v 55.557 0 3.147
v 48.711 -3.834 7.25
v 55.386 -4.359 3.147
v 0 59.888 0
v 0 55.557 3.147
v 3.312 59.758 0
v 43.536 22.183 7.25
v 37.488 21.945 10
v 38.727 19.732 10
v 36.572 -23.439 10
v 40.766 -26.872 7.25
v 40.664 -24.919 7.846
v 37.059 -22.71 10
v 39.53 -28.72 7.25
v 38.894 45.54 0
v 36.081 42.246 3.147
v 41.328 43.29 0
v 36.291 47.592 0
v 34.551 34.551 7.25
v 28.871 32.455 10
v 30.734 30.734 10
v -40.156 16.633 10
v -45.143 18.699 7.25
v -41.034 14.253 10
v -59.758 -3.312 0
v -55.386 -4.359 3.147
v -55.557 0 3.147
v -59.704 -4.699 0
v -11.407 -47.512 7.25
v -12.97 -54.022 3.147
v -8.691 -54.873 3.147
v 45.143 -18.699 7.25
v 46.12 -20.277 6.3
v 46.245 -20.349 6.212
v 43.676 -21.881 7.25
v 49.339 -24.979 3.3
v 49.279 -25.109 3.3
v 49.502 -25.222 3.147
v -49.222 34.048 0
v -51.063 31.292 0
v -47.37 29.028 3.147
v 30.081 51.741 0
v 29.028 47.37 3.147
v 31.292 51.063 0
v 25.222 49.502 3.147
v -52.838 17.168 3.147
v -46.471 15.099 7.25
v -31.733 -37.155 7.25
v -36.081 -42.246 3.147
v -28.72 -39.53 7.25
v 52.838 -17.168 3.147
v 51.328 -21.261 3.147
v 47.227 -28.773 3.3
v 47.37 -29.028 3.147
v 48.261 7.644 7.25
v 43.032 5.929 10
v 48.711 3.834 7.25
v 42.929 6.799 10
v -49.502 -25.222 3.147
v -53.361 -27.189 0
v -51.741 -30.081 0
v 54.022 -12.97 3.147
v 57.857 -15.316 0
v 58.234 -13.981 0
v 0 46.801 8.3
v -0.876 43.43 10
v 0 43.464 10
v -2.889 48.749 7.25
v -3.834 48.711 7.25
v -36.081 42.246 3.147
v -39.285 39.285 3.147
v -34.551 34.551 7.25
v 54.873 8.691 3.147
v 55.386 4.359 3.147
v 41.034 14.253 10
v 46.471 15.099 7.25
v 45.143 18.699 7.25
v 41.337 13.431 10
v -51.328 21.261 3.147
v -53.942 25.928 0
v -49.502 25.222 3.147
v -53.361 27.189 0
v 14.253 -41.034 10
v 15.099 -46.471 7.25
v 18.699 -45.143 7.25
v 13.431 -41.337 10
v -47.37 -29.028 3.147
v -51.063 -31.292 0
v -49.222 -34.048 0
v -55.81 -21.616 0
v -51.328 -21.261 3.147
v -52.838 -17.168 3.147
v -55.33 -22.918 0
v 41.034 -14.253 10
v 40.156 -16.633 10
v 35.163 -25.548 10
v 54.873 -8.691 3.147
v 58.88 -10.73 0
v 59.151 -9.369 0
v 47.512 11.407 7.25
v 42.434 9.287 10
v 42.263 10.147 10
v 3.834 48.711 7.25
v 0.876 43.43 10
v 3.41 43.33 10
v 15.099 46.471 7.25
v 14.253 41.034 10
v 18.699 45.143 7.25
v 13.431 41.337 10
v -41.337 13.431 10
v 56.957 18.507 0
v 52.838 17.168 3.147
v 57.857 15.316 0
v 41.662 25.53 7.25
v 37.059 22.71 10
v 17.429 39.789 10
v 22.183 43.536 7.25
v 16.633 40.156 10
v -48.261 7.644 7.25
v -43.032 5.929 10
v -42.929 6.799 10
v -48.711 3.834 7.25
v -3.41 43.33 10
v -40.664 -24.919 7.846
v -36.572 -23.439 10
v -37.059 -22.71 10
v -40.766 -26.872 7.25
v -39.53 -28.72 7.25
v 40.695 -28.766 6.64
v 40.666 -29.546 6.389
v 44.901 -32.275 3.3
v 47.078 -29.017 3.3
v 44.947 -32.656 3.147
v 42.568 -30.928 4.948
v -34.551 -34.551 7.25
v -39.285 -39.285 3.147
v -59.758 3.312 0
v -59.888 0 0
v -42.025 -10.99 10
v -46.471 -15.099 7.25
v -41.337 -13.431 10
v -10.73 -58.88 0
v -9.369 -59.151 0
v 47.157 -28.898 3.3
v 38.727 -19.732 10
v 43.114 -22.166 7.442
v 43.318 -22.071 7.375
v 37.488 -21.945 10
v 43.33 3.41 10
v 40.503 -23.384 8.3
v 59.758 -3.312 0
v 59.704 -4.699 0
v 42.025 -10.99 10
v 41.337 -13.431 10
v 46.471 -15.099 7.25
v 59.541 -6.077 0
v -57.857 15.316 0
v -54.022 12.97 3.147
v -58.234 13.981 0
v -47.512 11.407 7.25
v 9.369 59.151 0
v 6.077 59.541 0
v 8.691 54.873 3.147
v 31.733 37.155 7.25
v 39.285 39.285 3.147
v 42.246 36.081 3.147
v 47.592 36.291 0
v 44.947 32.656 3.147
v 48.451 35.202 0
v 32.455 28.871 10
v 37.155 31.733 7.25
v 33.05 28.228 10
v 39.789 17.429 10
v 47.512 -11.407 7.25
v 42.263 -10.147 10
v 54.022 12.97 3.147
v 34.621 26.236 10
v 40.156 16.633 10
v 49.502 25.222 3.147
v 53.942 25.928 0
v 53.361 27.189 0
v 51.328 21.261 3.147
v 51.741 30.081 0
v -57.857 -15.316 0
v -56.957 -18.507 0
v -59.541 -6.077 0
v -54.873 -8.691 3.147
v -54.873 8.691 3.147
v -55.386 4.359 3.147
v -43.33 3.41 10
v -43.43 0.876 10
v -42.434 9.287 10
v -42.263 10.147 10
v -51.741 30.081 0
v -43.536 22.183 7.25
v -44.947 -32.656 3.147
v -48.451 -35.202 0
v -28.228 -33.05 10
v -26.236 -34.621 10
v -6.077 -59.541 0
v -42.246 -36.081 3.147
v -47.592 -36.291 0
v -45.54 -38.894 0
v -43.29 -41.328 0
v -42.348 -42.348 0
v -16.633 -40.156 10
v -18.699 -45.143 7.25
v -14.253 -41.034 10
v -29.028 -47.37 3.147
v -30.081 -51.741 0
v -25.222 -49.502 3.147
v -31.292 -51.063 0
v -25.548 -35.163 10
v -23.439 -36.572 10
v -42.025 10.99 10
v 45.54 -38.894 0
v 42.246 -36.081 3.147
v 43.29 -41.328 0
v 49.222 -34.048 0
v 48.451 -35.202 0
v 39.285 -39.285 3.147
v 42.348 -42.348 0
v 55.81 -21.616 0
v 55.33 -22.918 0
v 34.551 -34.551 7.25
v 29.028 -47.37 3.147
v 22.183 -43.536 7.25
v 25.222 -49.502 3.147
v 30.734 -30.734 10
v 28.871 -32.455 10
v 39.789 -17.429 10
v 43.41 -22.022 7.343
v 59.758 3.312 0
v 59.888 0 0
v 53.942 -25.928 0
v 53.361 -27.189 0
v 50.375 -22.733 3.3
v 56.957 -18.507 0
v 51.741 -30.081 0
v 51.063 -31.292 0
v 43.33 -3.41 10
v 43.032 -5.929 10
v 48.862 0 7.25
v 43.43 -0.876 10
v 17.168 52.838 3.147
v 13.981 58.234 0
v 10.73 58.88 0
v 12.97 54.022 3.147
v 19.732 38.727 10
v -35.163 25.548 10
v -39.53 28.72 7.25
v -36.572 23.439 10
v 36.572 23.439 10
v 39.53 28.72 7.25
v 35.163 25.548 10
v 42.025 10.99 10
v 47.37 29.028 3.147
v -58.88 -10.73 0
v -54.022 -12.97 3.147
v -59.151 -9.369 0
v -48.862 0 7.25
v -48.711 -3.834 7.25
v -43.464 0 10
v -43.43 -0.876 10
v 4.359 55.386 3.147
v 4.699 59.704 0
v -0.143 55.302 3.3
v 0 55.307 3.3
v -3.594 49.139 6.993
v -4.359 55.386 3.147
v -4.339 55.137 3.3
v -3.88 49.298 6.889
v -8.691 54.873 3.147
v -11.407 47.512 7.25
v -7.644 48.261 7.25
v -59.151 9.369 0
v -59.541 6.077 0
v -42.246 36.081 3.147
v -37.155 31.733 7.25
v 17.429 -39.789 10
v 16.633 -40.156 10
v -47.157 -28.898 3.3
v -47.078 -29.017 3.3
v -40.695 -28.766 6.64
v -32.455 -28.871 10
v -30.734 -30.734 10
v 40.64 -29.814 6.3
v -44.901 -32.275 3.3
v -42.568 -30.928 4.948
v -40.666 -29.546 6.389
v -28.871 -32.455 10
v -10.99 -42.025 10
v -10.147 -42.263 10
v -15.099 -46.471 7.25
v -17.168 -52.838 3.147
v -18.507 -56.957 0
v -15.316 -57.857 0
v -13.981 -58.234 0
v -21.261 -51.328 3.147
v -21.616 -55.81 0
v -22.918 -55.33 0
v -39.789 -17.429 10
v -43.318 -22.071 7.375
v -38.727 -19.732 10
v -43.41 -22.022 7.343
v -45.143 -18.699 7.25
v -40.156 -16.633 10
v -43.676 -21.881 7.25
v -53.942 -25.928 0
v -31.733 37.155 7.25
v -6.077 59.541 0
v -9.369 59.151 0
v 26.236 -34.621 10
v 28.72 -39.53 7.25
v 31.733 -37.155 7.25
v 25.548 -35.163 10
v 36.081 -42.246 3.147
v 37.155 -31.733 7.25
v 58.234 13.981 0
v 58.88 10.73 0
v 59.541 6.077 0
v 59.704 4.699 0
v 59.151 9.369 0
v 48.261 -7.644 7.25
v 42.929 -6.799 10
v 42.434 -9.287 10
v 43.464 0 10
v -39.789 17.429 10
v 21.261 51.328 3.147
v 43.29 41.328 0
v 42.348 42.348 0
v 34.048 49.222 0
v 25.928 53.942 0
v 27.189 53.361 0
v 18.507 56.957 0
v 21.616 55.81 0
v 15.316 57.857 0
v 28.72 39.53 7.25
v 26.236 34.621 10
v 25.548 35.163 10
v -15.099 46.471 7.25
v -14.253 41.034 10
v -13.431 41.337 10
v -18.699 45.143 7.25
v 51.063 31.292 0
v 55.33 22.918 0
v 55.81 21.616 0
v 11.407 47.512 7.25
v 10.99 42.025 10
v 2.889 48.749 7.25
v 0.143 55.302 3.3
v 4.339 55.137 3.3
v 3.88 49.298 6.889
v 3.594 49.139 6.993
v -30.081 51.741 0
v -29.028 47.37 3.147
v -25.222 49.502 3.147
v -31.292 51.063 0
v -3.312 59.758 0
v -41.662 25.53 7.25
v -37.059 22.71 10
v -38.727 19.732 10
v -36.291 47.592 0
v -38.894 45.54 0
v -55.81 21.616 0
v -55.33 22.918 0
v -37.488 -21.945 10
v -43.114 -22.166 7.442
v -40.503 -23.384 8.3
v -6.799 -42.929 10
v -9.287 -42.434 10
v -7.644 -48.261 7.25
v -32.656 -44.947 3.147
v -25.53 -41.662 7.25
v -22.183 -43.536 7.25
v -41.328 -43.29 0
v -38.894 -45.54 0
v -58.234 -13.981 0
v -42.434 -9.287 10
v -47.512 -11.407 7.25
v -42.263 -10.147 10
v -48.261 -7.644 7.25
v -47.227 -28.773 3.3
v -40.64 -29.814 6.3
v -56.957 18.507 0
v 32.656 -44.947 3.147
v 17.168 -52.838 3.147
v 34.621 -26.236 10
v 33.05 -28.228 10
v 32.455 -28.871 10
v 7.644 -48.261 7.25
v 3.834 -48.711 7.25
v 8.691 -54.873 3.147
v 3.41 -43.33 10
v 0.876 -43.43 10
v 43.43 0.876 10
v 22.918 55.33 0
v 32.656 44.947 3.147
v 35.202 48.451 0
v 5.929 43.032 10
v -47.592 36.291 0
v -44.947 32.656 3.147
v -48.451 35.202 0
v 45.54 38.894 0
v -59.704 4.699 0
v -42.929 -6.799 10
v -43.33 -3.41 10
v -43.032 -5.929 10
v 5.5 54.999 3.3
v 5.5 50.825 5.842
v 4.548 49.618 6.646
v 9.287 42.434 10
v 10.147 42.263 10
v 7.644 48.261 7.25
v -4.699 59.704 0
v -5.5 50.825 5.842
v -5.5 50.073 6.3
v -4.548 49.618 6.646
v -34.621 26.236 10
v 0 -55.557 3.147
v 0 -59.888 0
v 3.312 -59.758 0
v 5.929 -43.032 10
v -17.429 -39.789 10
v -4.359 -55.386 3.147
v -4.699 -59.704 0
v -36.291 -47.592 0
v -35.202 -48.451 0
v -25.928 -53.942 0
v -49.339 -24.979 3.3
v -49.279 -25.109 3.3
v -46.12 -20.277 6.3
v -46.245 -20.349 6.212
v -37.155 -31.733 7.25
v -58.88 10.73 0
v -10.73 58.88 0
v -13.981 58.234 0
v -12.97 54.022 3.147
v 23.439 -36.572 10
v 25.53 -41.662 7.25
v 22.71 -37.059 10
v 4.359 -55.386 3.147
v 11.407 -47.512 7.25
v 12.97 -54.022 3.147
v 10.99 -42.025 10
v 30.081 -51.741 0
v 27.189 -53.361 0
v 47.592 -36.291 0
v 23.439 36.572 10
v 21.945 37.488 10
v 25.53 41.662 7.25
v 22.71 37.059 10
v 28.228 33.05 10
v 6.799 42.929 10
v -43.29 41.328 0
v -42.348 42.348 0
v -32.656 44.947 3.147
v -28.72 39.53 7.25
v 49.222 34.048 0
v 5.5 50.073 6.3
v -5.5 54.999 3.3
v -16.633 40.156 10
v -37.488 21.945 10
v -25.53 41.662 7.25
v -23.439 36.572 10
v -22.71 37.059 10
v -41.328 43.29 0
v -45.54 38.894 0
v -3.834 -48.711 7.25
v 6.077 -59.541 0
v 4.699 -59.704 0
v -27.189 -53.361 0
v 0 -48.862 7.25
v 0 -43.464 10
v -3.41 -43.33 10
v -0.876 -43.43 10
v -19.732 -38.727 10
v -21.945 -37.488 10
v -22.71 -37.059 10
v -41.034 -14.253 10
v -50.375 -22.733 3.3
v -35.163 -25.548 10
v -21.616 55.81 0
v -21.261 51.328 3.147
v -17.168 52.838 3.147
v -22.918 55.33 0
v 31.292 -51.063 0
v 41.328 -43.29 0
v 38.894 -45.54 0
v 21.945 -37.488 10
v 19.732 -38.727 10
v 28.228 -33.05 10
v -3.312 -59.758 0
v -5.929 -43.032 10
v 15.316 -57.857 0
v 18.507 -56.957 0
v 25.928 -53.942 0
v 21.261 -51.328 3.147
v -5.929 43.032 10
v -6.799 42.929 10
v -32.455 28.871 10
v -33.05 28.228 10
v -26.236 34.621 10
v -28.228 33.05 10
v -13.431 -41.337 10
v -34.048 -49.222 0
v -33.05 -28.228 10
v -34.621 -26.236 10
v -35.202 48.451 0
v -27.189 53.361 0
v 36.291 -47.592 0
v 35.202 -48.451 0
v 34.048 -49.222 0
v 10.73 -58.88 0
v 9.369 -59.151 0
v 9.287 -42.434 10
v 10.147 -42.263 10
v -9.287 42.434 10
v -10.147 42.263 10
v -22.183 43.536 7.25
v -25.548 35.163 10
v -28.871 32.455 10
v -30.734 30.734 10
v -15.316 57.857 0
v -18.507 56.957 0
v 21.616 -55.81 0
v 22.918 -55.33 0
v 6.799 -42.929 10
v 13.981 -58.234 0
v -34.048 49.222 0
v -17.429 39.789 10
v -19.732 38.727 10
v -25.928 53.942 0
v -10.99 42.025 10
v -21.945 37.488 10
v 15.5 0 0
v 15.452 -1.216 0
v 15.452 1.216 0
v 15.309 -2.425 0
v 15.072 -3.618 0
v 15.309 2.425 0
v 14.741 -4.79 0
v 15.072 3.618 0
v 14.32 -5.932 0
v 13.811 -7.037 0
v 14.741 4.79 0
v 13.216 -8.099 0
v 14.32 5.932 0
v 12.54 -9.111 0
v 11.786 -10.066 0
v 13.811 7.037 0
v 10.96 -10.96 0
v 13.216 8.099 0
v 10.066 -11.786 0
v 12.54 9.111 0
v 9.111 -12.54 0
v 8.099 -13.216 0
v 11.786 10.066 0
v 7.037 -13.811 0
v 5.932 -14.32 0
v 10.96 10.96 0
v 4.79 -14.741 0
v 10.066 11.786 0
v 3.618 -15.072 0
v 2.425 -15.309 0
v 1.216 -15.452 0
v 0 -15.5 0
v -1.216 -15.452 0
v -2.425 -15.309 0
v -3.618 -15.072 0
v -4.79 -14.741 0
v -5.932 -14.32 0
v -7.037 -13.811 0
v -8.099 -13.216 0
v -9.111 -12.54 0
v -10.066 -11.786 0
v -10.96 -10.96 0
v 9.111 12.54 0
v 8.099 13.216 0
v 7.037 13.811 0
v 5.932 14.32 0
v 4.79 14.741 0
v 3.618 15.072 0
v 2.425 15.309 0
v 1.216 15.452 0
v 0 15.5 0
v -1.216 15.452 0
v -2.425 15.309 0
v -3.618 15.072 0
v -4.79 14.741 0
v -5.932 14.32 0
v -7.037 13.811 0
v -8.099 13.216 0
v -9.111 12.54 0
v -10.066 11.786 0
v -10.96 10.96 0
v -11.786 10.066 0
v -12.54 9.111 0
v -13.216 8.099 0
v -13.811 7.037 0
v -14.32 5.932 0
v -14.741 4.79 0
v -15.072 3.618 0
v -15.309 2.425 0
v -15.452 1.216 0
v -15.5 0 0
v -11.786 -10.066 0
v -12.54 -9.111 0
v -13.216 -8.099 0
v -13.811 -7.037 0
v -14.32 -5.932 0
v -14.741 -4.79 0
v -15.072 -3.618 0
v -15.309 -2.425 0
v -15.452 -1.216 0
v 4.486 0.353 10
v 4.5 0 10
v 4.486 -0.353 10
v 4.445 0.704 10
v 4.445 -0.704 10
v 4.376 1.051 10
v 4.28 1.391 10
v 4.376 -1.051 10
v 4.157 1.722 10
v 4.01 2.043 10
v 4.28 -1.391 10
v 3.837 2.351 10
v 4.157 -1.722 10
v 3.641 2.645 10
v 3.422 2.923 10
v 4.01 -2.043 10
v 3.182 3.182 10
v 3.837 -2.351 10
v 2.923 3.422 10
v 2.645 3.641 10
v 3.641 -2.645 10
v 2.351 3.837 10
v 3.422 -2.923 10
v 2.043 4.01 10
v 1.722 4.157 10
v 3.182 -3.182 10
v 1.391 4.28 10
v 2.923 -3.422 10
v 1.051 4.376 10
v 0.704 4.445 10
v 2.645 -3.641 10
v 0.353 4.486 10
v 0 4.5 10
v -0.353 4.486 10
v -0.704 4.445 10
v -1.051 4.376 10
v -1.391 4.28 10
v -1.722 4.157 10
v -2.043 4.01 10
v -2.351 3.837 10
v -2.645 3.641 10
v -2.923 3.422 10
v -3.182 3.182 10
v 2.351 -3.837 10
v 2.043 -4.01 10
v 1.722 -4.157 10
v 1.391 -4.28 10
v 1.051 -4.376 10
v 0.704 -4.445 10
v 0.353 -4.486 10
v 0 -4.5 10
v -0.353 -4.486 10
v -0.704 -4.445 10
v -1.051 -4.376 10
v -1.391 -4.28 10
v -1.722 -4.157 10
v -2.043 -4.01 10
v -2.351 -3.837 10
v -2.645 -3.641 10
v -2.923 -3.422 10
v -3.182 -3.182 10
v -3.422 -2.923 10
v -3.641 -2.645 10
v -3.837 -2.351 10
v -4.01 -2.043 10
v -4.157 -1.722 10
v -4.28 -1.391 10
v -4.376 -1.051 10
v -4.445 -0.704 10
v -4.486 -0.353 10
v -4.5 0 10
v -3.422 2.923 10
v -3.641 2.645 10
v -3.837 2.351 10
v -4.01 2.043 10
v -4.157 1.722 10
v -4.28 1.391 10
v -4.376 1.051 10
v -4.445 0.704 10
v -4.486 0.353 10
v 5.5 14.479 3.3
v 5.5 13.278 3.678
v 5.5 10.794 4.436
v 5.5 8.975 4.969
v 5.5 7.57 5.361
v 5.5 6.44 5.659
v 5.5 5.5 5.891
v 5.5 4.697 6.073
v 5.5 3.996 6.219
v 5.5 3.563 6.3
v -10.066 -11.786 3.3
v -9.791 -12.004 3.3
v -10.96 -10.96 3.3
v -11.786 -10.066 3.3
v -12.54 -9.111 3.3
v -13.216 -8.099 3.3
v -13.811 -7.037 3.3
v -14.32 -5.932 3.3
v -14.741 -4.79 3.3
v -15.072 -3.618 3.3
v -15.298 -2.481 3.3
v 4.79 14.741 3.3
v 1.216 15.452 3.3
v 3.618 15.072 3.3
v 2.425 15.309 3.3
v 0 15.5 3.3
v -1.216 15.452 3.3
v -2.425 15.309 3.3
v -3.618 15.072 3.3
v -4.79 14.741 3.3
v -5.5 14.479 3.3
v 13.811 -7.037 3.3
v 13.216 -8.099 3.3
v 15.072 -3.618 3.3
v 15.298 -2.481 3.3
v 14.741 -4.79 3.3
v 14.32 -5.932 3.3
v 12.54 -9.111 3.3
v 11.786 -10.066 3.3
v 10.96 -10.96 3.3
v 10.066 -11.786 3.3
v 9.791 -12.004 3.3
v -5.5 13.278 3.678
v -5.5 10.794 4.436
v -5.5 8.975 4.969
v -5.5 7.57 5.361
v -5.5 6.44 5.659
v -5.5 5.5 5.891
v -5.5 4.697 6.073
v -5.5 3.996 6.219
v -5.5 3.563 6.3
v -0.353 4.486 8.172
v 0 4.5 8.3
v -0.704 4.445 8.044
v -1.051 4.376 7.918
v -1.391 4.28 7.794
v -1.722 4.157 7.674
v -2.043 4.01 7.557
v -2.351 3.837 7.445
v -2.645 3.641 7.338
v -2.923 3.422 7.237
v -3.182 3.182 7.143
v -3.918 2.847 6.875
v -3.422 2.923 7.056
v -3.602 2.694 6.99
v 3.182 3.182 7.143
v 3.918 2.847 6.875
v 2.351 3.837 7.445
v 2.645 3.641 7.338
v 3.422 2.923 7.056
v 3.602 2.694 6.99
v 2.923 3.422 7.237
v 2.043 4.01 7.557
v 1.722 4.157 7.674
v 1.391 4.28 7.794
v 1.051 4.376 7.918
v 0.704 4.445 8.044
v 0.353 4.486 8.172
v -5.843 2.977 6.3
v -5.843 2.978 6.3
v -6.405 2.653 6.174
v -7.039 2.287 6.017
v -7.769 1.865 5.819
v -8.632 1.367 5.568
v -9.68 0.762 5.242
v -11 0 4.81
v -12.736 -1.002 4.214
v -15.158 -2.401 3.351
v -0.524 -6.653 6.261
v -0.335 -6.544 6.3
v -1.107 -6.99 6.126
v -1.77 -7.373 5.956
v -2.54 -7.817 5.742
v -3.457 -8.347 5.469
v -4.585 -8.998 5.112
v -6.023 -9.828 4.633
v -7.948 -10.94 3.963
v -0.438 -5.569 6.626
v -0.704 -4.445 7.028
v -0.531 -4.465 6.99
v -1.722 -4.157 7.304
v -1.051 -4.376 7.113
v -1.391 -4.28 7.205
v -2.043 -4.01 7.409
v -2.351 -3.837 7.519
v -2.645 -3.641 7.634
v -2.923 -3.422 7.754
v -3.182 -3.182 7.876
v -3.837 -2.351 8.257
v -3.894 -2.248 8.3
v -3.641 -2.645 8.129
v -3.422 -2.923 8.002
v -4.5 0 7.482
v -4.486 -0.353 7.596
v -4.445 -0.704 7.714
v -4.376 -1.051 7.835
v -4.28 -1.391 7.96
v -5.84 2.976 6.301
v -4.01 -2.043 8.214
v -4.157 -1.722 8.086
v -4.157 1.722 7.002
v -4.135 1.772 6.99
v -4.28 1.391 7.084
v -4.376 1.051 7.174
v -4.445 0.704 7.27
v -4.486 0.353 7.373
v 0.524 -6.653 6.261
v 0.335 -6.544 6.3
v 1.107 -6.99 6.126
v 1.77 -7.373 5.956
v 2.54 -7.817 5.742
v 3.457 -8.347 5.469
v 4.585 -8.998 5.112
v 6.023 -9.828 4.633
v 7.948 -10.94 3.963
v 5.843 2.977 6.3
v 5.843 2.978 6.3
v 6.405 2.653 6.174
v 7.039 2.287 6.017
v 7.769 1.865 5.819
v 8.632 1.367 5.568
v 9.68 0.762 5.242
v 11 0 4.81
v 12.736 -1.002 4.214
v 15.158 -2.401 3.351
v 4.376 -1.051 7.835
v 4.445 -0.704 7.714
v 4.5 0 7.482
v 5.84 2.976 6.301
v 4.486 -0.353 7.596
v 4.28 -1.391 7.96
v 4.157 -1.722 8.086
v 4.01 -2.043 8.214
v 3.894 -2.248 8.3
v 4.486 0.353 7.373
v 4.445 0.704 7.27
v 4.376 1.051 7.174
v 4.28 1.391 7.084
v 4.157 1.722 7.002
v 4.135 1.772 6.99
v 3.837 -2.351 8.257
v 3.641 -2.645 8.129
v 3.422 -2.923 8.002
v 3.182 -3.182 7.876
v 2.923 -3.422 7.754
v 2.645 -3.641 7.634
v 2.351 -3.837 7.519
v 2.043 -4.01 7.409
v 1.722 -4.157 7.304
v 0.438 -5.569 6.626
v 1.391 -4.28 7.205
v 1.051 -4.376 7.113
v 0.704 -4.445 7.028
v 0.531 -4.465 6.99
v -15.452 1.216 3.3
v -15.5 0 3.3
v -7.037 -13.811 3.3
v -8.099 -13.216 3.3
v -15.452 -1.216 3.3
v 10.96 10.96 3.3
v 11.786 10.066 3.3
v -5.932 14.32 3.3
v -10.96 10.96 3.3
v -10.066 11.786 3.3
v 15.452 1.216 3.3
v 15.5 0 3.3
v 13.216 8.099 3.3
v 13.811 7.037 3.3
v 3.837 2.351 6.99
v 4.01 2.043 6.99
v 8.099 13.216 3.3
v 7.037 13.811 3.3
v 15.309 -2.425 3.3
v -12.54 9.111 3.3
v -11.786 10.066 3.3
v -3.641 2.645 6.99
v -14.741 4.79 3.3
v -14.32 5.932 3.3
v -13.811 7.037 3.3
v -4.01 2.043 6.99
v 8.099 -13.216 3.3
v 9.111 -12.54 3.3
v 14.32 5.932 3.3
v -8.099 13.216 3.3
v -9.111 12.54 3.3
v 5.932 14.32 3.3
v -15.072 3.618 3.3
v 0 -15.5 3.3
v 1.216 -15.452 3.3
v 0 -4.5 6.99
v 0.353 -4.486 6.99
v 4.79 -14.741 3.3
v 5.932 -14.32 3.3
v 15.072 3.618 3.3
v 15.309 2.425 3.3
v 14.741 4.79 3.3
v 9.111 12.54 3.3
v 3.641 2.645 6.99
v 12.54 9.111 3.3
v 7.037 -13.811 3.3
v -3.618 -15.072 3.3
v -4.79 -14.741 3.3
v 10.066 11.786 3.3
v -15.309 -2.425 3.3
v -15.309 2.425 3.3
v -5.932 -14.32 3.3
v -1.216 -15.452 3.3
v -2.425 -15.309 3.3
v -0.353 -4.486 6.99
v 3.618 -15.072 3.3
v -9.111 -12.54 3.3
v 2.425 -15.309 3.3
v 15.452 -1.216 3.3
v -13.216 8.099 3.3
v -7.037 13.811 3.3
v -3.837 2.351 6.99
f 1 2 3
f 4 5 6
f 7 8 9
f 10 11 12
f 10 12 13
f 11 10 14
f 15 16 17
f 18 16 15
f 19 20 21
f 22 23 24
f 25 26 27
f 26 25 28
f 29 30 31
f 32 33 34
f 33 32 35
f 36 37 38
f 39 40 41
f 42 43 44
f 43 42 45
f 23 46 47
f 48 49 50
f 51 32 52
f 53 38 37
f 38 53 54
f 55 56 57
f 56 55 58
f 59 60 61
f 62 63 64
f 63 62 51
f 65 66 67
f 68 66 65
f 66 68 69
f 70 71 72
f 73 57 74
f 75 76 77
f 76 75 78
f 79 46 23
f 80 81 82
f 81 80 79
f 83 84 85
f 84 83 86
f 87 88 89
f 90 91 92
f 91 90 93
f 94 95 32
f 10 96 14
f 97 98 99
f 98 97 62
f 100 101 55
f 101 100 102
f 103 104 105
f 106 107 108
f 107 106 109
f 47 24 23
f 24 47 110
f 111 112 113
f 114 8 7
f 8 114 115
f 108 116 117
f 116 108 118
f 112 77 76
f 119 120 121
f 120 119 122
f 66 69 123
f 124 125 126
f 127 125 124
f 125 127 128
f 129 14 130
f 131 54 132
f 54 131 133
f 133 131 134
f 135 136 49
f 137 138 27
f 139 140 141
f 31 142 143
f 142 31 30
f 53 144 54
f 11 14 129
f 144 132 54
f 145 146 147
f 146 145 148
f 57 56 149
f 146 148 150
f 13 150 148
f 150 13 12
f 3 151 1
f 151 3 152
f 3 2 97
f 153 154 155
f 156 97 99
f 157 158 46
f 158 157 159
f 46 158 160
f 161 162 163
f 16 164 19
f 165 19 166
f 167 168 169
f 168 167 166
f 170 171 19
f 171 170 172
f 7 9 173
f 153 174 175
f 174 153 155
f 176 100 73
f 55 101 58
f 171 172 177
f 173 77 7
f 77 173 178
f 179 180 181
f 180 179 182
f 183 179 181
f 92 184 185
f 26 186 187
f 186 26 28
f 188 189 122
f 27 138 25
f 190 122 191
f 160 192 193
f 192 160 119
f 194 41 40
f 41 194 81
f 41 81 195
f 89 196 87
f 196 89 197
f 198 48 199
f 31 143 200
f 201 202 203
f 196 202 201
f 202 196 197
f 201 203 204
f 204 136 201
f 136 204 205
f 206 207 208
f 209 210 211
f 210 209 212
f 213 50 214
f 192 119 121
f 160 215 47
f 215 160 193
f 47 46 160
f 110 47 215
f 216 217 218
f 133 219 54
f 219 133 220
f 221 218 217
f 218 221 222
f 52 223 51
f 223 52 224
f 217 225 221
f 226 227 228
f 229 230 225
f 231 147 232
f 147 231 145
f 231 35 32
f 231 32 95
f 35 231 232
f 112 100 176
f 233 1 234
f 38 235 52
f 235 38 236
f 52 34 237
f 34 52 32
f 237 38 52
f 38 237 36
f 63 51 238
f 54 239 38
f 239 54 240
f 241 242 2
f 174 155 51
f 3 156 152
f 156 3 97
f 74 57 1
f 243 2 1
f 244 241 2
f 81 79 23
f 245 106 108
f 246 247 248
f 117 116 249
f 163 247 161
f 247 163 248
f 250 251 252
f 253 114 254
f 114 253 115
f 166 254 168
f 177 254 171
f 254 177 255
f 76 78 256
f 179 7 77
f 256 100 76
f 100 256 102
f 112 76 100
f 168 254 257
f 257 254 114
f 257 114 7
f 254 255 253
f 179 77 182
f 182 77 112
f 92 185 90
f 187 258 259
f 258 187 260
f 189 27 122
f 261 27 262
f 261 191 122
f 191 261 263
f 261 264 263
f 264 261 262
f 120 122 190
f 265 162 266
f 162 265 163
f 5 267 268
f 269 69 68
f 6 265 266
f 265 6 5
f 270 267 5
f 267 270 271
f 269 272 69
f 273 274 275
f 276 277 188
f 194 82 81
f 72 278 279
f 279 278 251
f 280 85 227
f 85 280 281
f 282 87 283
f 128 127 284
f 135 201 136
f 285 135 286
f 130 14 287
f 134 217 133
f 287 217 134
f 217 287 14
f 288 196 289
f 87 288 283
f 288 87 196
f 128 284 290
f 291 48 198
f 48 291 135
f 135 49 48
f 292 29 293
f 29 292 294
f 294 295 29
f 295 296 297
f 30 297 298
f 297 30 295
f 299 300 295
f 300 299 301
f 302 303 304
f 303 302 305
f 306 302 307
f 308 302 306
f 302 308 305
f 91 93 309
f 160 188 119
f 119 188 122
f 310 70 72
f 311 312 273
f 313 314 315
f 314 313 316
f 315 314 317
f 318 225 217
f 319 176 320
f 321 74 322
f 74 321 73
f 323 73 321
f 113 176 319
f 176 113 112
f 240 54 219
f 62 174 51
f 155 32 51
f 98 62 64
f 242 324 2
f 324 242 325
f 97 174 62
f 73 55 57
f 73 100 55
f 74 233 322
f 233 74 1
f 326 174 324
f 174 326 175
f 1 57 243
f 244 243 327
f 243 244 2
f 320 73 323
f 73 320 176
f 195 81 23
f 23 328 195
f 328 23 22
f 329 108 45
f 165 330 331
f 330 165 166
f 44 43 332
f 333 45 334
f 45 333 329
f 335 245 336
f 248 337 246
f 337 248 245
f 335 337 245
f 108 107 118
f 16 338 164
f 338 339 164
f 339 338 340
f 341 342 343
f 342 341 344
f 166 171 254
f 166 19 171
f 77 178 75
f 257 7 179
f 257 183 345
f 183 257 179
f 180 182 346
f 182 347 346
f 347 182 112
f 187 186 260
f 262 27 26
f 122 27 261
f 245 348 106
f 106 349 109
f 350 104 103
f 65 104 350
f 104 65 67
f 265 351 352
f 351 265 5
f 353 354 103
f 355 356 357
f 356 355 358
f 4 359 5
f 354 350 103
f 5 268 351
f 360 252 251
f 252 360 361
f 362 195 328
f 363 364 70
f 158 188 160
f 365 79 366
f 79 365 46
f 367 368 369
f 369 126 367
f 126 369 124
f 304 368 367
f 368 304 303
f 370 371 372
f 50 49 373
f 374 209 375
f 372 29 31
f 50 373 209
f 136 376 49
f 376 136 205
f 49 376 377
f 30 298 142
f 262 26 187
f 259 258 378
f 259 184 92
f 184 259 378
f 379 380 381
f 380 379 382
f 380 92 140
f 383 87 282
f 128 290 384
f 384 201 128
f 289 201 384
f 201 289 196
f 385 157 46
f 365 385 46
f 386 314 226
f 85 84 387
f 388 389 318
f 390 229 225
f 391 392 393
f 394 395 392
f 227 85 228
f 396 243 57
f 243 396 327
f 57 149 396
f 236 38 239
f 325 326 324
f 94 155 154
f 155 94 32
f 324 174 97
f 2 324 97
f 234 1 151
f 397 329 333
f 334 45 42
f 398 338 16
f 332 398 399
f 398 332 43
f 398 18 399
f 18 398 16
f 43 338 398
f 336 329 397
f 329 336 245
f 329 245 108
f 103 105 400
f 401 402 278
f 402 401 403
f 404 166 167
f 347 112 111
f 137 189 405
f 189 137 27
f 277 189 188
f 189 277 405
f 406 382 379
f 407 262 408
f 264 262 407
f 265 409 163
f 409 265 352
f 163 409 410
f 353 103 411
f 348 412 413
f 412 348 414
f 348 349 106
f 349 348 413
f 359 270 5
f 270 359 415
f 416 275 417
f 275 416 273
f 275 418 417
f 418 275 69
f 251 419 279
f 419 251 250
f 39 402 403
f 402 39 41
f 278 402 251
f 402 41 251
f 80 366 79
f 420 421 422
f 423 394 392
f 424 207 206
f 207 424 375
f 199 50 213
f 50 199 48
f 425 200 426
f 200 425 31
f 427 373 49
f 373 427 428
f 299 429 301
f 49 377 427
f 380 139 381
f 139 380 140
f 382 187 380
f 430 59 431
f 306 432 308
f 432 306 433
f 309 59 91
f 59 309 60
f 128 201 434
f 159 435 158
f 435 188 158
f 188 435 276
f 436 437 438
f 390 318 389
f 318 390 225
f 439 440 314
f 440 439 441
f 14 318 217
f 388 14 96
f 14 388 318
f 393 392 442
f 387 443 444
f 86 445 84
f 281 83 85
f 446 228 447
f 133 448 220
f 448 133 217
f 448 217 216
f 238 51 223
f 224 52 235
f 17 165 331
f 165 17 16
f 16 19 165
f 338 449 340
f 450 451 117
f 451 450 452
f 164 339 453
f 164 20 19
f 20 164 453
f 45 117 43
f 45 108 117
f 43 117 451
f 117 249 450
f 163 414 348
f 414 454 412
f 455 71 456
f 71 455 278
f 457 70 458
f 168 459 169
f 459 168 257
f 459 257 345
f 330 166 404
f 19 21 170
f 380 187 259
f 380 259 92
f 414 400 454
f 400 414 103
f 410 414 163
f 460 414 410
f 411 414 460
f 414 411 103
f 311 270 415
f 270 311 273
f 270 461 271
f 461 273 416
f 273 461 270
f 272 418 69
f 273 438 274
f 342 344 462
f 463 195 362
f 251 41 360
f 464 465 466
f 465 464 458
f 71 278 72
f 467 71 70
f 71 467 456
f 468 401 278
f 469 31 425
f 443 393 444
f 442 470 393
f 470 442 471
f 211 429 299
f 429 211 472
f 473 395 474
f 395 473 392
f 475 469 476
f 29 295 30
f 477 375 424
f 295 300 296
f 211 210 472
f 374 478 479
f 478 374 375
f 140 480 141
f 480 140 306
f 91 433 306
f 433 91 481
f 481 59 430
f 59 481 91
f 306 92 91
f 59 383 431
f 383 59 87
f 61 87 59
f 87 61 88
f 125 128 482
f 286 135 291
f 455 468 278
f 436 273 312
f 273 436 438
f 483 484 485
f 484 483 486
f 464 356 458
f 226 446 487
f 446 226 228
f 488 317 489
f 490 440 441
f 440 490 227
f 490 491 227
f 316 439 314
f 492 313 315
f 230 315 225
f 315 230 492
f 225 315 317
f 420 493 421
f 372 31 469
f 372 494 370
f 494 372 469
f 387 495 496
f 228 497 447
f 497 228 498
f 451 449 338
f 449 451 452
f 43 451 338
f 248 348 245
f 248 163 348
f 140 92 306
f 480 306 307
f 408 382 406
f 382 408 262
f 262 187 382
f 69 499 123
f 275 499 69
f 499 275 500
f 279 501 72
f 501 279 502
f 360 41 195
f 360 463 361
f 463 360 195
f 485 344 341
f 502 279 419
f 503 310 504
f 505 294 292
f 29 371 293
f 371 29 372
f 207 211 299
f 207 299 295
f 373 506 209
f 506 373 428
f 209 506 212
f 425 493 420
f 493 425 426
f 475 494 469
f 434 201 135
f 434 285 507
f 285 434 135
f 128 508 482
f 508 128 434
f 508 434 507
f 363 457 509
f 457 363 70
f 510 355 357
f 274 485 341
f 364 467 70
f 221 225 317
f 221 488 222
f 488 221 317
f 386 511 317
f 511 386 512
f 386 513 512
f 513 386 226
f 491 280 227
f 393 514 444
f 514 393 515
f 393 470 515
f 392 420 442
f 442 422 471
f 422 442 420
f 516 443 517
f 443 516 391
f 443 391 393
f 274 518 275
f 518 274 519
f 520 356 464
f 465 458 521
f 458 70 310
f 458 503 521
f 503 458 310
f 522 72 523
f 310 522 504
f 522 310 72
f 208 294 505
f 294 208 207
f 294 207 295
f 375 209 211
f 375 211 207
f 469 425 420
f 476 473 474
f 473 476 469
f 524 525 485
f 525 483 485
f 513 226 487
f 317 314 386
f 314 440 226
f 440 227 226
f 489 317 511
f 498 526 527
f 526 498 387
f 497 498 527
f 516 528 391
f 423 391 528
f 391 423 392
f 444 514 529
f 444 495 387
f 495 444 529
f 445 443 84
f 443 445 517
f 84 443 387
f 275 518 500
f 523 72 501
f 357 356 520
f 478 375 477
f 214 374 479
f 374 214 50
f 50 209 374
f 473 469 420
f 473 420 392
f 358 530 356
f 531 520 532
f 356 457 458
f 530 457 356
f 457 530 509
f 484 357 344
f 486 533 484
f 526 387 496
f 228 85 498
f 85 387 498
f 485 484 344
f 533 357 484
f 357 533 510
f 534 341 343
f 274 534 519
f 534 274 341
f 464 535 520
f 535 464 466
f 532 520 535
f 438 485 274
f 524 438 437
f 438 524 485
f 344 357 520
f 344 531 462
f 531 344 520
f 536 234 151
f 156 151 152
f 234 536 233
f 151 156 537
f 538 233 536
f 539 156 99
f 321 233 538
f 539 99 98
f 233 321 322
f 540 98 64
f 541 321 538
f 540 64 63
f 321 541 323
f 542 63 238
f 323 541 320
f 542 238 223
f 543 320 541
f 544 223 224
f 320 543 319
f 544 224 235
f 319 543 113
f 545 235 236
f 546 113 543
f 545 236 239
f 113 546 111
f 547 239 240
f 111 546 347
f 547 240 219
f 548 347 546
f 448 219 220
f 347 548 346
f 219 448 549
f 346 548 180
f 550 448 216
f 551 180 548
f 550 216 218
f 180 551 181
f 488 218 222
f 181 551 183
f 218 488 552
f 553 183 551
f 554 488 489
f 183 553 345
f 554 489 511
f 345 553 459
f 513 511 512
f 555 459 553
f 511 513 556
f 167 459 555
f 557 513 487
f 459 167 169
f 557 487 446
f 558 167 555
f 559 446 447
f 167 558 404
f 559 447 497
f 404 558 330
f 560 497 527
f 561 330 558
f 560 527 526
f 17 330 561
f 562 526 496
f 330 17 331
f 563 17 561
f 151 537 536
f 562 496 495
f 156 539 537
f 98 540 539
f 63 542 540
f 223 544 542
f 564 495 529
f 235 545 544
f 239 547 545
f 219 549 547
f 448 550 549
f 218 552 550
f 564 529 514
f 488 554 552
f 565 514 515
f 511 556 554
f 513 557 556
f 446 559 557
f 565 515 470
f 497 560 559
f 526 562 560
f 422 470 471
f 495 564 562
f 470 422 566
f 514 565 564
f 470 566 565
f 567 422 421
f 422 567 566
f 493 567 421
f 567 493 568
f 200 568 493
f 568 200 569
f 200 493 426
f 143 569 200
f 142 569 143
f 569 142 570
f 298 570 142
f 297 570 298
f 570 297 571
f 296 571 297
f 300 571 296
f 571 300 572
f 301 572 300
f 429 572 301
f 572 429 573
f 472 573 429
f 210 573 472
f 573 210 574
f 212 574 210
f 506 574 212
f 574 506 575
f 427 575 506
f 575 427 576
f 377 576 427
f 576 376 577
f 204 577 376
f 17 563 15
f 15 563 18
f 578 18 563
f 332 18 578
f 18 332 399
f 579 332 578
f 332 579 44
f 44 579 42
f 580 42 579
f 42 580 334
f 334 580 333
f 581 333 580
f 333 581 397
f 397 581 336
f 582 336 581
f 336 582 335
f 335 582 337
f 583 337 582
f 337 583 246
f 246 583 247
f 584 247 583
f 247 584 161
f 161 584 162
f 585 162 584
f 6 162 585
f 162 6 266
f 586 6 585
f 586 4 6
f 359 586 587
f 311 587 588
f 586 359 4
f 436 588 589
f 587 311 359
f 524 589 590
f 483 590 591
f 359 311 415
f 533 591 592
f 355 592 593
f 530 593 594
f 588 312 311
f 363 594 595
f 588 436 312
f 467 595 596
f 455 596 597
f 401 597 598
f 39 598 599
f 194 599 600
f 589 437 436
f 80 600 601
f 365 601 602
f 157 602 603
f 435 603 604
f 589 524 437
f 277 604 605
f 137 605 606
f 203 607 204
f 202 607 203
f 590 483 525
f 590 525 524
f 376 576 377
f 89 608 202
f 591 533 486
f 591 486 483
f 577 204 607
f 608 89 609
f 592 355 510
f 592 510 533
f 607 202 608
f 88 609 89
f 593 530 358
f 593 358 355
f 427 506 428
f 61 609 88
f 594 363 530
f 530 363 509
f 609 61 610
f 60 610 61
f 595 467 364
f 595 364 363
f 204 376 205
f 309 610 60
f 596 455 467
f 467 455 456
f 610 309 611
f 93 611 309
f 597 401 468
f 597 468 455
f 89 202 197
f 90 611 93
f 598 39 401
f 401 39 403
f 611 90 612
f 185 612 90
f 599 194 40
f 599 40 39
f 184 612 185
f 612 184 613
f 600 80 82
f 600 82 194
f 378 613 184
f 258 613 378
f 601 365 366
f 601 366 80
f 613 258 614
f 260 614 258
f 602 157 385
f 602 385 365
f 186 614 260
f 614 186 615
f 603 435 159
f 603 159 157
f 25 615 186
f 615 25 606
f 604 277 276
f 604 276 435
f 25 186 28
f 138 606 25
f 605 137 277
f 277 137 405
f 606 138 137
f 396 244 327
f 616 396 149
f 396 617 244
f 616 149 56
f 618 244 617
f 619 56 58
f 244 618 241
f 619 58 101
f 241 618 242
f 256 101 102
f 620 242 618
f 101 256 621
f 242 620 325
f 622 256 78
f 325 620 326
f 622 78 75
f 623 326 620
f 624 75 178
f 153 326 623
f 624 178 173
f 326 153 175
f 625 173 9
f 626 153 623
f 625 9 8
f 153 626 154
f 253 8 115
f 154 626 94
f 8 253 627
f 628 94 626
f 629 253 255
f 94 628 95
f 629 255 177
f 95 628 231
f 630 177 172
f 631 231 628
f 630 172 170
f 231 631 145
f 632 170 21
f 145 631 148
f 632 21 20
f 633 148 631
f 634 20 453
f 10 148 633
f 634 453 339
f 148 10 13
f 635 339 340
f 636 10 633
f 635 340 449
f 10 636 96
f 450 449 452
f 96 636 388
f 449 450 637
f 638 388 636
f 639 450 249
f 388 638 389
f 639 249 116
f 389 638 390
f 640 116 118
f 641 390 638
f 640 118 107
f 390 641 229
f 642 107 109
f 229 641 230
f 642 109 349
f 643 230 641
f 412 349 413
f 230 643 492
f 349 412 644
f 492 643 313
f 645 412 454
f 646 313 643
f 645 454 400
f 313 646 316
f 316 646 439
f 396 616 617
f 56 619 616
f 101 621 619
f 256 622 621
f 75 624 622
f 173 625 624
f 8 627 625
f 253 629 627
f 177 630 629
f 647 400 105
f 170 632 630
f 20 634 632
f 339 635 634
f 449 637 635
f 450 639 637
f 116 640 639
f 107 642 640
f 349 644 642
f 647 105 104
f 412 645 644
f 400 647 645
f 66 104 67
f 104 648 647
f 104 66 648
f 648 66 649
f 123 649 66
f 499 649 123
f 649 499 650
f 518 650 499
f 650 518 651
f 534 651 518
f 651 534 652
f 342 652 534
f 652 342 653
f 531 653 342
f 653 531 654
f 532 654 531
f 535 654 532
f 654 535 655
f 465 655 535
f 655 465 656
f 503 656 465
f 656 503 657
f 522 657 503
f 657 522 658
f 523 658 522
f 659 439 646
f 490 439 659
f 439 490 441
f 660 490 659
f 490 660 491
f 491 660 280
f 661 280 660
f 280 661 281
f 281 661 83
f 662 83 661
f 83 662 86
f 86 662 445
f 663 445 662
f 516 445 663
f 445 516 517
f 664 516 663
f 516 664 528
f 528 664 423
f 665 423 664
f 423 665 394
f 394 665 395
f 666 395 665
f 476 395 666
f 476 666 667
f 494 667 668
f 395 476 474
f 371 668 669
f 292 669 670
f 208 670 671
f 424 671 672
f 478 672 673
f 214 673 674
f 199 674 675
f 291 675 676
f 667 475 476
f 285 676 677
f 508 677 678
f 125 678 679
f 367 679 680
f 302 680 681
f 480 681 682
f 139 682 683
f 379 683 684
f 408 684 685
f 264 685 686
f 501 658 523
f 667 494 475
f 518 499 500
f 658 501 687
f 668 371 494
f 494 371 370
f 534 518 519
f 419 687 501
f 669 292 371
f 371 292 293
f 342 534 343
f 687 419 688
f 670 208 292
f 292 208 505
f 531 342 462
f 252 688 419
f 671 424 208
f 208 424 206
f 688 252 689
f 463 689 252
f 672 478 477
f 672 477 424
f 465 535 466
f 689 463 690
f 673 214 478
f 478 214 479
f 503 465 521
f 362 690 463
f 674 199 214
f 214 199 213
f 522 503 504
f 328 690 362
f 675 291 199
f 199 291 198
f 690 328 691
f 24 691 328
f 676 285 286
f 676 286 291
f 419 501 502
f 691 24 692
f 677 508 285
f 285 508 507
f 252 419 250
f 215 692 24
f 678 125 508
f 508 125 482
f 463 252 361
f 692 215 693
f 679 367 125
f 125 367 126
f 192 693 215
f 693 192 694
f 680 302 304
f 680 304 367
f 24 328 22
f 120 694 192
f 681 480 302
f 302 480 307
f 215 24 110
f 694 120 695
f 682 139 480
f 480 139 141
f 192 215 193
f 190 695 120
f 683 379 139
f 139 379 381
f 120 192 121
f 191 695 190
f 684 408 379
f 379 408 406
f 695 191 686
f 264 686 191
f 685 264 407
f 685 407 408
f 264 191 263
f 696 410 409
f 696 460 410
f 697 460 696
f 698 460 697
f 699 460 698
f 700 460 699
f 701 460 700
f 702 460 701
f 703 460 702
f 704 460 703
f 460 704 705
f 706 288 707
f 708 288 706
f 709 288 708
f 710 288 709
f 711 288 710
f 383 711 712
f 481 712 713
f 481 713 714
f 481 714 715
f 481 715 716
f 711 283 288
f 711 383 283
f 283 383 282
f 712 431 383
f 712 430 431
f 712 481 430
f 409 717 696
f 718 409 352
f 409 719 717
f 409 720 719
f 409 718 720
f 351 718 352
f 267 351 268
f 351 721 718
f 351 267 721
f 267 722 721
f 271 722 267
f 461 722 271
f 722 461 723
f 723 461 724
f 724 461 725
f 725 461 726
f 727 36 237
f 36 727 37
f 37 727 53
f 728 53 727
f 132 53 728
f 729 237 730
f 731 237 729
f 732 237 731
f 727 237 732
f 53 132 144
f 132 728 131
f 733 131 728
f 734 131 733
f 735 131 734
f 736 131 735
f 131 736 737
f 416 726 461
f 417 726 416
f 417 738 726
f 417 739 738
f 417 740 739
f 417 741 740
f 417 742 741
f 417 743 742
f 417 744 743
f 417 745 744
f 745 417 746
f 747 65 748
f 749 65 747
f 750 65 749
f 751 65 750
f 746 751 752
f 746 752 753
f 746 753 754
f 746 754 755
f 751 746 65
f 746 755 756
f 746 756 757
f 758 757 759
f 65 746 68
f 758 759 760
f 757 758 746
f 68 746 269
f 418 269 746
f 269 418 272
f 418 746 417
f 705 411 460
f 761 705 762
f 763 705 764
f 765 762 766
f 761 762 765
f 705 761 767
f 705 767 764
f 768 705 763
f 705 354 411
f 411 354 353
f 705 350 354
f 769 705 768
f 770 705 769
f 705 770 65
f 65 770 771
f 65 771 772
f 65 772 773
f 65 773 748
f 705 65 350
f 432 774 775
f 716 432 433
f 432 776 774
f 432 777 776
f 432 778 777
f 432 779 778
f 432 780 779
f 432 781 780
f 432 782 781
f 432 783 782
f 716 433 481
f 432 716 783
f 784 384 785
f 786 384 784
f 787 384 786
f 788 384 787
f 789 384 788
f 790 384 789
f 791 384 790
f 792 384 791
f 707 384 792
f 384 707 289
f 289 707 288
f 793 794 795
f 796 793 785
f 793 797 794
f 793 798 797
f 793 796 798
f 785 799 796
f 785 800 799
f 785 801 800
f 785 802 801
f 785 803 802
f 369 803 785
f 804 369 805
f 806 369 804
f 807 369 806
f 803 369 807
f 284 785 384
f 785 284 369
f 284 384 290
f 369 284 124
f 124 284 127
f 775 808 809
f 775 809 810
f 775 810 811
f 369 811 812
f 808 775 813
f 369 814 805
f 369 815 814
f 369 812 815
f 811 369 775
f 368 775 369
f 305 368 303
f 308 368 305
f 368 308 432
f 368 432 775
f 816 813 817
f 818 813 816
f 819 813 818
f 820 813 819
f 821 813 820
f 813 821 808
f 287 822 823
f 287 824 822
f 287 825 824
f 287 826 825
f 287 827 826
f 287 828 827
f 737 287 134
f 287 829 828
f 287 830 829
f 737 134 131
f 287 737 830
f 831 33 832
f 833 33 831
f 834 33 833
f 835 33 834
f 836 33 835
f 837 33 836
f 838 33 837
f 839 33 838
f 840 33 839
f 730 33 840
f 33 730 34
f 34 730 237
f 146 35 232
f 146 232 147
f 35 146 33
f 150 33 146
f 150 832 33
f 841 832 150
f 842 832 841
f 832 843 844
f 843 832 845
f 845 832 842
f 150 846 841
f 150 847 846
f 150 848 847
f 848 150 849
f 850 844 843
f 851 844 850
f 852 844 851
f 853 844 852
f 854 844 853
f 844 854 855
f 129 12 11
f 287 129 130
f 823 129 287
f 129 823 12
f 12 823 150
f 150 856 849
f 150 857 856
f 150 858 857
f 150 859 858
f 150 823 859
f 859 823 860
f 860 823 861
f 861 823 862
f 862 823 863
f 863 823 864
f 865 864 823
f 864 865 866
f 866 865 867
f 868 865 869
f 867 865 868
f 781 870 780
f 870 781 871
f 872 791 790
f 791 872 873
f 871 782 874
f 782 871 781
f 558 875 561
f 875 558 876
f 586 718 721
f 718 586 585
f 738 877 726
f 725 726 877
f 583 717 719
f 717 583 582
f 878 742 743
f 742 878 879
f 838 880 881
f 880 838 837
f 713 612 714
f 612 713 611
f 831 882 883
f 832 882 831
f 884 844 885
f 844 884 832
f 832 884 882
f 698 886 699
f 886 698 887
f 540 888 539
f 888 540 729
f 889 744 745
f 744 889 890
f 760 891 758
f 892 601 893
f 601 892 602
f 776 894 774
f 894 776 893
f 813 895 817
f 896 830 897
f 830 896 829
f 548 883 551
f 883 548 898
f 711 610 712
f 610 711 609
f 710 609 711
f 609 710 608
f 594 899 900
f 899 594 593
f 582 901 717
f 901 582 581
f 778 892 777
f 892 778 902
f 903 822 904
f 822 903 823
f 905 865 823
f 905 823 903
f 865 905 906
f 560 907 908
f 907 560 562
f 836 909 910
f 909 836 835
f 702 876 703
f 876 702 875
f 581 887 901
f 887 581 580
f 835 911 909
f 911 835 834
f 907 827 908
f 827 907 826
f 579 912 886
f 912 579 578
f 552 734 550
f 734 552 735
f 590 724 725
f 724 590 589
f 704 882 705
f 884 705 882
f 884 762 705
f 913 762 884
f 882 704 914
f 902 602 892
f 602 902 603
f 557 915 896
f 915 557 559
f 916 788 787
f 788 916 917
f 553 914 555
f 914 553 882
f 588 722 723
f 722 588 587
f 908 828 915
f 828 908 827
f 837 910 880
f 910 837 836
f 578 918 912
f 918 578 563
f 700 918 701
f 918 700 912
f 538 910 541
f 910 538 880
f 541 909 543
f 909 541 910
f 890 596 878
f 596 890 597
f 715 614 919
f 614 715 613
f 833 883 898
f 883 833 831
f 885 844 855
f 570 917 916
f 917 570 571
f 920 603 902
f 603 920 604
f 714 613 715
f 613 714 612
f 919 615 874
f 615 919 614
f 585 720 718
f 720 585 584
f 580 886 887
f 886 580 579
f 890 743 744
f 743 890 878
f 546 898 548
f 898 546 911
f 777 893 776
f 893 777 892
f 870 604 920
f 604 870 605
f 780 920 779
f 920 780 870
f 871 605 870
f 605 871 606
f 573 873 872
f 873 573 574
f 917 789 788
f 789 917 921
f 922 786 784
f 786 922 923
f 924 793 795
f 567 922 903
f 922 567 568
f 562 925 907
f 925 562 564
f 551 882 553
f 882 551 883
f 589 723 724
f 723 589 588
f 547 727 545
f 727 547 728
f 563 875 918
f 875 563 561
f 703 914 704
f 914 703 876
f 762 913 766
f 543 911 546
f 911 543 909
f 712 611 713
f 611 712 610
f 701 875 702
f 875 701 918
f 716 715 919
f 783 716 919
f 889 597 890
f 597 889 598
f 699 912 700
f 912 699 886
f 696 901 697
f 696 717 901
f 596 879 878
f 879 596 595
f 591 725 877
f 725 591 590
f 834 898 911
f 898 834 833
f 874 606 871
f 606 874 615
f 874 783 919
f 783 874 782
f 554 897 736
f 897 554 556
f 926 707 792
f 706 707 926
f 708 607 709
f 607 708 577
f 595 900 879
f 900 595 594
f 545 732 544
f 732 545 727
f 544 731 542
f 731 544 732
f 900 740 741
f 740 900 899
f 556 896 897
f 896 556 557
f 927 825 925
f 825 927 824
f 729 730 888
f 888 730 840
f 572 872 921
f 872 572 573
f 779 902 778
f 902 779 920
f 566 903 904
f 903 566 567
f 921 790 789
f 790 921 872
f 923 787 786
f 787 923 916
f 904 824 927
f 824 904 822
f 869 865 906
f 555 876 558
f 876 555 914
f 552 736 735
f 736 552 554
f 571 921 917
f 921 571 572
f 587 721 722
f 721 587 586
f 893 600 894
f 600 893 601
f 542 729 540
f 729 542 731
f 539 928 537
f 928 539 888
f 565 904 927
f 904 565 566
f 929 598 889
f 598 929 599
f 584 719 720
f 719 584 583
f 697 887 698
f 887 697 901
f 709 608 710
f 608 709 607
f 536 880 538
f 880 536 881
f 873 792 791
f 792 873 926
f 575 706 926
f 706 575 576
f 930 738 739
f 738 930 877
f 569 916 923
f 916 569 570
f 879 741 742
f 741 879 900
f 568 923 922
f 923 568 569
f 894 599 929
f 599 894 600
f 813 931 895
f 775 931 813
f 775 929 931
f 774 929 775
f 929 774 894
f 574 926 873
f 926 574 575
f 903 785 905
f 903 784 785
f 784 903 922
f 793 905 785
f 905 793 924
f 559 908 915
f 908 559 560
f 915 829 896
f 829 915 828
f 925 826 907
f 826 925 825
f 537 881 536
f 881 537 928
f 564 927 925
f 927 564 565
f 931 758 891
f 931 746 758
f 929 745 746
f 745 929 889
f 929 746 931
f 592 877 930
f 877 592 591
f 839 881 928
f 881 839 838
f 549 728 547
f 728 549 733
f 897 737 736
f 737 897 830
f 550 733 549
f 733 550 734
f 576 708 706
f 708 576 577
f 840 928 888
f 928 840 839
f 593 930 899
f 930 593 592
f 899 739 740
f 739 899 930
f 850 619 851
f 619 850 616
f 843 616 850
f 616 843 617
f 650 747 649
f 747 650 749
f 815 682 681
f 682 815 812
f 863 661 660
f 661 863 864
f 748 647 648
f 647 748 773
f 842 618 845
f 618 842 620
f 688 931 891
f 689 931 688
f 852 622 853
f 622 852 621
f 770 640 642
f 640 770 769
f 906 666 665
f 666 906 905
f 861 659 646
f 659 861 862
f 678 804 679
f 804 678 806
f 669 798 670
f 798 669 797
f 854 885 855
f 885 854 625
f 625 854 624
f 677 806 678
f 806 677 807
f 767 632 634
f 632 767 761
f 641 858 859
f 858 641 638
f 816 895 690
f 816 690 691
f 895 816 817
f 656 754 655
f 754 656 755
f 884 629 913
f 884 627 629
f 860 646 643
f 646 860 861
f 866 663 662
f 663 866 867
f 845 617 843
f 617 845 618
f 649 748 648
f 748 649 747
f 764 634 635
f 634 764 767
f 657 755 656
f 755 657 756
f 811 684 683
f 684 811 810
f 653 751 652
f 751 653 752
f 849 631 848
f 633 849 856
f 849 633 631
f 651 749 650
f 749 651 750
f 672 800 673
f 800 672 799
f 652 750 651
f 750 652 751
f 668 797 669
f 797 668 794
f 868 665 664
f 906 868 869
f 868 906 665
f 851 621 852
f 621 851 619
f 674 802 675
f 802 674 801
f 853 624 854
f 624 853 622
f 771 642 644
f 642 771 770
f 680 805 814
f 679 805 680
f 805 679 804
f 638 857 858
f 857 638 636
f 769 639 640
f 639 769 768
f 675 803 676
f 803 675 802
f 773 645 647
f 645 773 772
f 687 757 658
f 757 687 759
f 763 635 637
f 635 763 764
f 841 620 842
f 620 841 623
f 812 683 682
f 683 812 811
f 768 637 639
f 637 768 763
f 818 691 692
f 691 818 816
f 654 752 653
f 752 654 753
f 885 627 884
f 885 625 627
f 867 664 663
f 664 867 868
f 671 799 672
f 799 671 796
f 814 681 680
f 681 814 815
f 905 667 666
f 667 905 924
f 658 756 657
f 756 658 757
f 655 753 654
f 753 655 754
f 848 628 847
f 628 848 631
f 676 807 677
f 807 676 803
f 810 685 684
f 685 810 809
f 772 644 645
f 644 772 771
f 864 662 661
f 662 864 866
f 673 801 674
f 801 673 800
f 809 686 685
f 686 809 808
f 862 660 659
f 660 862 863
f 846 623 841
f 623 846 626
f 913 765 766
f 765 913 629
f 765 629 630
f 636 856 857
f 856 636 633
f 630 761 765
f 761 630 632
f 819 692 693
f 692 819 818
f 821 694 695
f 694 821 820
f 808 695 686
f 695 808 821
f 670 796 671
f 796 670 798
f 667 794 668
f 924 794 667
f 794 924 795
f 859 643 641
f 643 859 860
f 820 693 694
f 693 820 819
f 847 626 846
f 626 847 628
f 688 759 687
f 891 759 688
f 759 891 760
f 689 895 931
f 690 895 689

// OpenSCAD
$fn=80;

aimant_largeur = 11;
aimant_hauteur = 3;
aimant_largeur = 11;
aimant_hauteur_dome = 2;
aimant_rayon_dome =
aimant_hauteur_dome/2 + (aimant_largeur*aimant_largeur)/(8*aimant_hauteur_dome);

module maSphere() {translate([0,0,-80]) sphere(100);}
module monCube() {translate([0,0,60]) cube(120, center=true);}
module monCubeSup() {translate([0,0,70]) cube(120, center=true);}

module monDome() {
    difference() {
        intersection() {maSphere();monCube();};
        monCubeSup();
    }
}

module monAimant() {
    cube([aimant_largeur,15+59.1,aimant_hauteur]);
    translate([0,0,aimant_hauteur]) rotate([-90,0,0])
    linear_extrude(height=15+59.1) {
        polygon(points=[[0,0],
                        [aimant_largeur  , 0],
                        [aimant_largeur/2, -aimant_hauteur_dome]]);
    }
}

module mesAimants() { 
    for(i=[0:3]) {
        rotate([0,0,i*120]) translate([-aimant_largeur/2,0,3.3]) monAimant();
    }
}
module teteDeVisseuse() {
    rotate_extrude()
        polygon(points=[[   0,0],
                        [31/2,0],
                        [31/2,3.3],
                        [   0,8.5]]);
    cylinder(d=9,h=20);
}

module main() {
    difference() {
        monDome();
        mesAimants();
        teteDeVisseuse();
    }
}
//teteDeVisseuse();
main();
